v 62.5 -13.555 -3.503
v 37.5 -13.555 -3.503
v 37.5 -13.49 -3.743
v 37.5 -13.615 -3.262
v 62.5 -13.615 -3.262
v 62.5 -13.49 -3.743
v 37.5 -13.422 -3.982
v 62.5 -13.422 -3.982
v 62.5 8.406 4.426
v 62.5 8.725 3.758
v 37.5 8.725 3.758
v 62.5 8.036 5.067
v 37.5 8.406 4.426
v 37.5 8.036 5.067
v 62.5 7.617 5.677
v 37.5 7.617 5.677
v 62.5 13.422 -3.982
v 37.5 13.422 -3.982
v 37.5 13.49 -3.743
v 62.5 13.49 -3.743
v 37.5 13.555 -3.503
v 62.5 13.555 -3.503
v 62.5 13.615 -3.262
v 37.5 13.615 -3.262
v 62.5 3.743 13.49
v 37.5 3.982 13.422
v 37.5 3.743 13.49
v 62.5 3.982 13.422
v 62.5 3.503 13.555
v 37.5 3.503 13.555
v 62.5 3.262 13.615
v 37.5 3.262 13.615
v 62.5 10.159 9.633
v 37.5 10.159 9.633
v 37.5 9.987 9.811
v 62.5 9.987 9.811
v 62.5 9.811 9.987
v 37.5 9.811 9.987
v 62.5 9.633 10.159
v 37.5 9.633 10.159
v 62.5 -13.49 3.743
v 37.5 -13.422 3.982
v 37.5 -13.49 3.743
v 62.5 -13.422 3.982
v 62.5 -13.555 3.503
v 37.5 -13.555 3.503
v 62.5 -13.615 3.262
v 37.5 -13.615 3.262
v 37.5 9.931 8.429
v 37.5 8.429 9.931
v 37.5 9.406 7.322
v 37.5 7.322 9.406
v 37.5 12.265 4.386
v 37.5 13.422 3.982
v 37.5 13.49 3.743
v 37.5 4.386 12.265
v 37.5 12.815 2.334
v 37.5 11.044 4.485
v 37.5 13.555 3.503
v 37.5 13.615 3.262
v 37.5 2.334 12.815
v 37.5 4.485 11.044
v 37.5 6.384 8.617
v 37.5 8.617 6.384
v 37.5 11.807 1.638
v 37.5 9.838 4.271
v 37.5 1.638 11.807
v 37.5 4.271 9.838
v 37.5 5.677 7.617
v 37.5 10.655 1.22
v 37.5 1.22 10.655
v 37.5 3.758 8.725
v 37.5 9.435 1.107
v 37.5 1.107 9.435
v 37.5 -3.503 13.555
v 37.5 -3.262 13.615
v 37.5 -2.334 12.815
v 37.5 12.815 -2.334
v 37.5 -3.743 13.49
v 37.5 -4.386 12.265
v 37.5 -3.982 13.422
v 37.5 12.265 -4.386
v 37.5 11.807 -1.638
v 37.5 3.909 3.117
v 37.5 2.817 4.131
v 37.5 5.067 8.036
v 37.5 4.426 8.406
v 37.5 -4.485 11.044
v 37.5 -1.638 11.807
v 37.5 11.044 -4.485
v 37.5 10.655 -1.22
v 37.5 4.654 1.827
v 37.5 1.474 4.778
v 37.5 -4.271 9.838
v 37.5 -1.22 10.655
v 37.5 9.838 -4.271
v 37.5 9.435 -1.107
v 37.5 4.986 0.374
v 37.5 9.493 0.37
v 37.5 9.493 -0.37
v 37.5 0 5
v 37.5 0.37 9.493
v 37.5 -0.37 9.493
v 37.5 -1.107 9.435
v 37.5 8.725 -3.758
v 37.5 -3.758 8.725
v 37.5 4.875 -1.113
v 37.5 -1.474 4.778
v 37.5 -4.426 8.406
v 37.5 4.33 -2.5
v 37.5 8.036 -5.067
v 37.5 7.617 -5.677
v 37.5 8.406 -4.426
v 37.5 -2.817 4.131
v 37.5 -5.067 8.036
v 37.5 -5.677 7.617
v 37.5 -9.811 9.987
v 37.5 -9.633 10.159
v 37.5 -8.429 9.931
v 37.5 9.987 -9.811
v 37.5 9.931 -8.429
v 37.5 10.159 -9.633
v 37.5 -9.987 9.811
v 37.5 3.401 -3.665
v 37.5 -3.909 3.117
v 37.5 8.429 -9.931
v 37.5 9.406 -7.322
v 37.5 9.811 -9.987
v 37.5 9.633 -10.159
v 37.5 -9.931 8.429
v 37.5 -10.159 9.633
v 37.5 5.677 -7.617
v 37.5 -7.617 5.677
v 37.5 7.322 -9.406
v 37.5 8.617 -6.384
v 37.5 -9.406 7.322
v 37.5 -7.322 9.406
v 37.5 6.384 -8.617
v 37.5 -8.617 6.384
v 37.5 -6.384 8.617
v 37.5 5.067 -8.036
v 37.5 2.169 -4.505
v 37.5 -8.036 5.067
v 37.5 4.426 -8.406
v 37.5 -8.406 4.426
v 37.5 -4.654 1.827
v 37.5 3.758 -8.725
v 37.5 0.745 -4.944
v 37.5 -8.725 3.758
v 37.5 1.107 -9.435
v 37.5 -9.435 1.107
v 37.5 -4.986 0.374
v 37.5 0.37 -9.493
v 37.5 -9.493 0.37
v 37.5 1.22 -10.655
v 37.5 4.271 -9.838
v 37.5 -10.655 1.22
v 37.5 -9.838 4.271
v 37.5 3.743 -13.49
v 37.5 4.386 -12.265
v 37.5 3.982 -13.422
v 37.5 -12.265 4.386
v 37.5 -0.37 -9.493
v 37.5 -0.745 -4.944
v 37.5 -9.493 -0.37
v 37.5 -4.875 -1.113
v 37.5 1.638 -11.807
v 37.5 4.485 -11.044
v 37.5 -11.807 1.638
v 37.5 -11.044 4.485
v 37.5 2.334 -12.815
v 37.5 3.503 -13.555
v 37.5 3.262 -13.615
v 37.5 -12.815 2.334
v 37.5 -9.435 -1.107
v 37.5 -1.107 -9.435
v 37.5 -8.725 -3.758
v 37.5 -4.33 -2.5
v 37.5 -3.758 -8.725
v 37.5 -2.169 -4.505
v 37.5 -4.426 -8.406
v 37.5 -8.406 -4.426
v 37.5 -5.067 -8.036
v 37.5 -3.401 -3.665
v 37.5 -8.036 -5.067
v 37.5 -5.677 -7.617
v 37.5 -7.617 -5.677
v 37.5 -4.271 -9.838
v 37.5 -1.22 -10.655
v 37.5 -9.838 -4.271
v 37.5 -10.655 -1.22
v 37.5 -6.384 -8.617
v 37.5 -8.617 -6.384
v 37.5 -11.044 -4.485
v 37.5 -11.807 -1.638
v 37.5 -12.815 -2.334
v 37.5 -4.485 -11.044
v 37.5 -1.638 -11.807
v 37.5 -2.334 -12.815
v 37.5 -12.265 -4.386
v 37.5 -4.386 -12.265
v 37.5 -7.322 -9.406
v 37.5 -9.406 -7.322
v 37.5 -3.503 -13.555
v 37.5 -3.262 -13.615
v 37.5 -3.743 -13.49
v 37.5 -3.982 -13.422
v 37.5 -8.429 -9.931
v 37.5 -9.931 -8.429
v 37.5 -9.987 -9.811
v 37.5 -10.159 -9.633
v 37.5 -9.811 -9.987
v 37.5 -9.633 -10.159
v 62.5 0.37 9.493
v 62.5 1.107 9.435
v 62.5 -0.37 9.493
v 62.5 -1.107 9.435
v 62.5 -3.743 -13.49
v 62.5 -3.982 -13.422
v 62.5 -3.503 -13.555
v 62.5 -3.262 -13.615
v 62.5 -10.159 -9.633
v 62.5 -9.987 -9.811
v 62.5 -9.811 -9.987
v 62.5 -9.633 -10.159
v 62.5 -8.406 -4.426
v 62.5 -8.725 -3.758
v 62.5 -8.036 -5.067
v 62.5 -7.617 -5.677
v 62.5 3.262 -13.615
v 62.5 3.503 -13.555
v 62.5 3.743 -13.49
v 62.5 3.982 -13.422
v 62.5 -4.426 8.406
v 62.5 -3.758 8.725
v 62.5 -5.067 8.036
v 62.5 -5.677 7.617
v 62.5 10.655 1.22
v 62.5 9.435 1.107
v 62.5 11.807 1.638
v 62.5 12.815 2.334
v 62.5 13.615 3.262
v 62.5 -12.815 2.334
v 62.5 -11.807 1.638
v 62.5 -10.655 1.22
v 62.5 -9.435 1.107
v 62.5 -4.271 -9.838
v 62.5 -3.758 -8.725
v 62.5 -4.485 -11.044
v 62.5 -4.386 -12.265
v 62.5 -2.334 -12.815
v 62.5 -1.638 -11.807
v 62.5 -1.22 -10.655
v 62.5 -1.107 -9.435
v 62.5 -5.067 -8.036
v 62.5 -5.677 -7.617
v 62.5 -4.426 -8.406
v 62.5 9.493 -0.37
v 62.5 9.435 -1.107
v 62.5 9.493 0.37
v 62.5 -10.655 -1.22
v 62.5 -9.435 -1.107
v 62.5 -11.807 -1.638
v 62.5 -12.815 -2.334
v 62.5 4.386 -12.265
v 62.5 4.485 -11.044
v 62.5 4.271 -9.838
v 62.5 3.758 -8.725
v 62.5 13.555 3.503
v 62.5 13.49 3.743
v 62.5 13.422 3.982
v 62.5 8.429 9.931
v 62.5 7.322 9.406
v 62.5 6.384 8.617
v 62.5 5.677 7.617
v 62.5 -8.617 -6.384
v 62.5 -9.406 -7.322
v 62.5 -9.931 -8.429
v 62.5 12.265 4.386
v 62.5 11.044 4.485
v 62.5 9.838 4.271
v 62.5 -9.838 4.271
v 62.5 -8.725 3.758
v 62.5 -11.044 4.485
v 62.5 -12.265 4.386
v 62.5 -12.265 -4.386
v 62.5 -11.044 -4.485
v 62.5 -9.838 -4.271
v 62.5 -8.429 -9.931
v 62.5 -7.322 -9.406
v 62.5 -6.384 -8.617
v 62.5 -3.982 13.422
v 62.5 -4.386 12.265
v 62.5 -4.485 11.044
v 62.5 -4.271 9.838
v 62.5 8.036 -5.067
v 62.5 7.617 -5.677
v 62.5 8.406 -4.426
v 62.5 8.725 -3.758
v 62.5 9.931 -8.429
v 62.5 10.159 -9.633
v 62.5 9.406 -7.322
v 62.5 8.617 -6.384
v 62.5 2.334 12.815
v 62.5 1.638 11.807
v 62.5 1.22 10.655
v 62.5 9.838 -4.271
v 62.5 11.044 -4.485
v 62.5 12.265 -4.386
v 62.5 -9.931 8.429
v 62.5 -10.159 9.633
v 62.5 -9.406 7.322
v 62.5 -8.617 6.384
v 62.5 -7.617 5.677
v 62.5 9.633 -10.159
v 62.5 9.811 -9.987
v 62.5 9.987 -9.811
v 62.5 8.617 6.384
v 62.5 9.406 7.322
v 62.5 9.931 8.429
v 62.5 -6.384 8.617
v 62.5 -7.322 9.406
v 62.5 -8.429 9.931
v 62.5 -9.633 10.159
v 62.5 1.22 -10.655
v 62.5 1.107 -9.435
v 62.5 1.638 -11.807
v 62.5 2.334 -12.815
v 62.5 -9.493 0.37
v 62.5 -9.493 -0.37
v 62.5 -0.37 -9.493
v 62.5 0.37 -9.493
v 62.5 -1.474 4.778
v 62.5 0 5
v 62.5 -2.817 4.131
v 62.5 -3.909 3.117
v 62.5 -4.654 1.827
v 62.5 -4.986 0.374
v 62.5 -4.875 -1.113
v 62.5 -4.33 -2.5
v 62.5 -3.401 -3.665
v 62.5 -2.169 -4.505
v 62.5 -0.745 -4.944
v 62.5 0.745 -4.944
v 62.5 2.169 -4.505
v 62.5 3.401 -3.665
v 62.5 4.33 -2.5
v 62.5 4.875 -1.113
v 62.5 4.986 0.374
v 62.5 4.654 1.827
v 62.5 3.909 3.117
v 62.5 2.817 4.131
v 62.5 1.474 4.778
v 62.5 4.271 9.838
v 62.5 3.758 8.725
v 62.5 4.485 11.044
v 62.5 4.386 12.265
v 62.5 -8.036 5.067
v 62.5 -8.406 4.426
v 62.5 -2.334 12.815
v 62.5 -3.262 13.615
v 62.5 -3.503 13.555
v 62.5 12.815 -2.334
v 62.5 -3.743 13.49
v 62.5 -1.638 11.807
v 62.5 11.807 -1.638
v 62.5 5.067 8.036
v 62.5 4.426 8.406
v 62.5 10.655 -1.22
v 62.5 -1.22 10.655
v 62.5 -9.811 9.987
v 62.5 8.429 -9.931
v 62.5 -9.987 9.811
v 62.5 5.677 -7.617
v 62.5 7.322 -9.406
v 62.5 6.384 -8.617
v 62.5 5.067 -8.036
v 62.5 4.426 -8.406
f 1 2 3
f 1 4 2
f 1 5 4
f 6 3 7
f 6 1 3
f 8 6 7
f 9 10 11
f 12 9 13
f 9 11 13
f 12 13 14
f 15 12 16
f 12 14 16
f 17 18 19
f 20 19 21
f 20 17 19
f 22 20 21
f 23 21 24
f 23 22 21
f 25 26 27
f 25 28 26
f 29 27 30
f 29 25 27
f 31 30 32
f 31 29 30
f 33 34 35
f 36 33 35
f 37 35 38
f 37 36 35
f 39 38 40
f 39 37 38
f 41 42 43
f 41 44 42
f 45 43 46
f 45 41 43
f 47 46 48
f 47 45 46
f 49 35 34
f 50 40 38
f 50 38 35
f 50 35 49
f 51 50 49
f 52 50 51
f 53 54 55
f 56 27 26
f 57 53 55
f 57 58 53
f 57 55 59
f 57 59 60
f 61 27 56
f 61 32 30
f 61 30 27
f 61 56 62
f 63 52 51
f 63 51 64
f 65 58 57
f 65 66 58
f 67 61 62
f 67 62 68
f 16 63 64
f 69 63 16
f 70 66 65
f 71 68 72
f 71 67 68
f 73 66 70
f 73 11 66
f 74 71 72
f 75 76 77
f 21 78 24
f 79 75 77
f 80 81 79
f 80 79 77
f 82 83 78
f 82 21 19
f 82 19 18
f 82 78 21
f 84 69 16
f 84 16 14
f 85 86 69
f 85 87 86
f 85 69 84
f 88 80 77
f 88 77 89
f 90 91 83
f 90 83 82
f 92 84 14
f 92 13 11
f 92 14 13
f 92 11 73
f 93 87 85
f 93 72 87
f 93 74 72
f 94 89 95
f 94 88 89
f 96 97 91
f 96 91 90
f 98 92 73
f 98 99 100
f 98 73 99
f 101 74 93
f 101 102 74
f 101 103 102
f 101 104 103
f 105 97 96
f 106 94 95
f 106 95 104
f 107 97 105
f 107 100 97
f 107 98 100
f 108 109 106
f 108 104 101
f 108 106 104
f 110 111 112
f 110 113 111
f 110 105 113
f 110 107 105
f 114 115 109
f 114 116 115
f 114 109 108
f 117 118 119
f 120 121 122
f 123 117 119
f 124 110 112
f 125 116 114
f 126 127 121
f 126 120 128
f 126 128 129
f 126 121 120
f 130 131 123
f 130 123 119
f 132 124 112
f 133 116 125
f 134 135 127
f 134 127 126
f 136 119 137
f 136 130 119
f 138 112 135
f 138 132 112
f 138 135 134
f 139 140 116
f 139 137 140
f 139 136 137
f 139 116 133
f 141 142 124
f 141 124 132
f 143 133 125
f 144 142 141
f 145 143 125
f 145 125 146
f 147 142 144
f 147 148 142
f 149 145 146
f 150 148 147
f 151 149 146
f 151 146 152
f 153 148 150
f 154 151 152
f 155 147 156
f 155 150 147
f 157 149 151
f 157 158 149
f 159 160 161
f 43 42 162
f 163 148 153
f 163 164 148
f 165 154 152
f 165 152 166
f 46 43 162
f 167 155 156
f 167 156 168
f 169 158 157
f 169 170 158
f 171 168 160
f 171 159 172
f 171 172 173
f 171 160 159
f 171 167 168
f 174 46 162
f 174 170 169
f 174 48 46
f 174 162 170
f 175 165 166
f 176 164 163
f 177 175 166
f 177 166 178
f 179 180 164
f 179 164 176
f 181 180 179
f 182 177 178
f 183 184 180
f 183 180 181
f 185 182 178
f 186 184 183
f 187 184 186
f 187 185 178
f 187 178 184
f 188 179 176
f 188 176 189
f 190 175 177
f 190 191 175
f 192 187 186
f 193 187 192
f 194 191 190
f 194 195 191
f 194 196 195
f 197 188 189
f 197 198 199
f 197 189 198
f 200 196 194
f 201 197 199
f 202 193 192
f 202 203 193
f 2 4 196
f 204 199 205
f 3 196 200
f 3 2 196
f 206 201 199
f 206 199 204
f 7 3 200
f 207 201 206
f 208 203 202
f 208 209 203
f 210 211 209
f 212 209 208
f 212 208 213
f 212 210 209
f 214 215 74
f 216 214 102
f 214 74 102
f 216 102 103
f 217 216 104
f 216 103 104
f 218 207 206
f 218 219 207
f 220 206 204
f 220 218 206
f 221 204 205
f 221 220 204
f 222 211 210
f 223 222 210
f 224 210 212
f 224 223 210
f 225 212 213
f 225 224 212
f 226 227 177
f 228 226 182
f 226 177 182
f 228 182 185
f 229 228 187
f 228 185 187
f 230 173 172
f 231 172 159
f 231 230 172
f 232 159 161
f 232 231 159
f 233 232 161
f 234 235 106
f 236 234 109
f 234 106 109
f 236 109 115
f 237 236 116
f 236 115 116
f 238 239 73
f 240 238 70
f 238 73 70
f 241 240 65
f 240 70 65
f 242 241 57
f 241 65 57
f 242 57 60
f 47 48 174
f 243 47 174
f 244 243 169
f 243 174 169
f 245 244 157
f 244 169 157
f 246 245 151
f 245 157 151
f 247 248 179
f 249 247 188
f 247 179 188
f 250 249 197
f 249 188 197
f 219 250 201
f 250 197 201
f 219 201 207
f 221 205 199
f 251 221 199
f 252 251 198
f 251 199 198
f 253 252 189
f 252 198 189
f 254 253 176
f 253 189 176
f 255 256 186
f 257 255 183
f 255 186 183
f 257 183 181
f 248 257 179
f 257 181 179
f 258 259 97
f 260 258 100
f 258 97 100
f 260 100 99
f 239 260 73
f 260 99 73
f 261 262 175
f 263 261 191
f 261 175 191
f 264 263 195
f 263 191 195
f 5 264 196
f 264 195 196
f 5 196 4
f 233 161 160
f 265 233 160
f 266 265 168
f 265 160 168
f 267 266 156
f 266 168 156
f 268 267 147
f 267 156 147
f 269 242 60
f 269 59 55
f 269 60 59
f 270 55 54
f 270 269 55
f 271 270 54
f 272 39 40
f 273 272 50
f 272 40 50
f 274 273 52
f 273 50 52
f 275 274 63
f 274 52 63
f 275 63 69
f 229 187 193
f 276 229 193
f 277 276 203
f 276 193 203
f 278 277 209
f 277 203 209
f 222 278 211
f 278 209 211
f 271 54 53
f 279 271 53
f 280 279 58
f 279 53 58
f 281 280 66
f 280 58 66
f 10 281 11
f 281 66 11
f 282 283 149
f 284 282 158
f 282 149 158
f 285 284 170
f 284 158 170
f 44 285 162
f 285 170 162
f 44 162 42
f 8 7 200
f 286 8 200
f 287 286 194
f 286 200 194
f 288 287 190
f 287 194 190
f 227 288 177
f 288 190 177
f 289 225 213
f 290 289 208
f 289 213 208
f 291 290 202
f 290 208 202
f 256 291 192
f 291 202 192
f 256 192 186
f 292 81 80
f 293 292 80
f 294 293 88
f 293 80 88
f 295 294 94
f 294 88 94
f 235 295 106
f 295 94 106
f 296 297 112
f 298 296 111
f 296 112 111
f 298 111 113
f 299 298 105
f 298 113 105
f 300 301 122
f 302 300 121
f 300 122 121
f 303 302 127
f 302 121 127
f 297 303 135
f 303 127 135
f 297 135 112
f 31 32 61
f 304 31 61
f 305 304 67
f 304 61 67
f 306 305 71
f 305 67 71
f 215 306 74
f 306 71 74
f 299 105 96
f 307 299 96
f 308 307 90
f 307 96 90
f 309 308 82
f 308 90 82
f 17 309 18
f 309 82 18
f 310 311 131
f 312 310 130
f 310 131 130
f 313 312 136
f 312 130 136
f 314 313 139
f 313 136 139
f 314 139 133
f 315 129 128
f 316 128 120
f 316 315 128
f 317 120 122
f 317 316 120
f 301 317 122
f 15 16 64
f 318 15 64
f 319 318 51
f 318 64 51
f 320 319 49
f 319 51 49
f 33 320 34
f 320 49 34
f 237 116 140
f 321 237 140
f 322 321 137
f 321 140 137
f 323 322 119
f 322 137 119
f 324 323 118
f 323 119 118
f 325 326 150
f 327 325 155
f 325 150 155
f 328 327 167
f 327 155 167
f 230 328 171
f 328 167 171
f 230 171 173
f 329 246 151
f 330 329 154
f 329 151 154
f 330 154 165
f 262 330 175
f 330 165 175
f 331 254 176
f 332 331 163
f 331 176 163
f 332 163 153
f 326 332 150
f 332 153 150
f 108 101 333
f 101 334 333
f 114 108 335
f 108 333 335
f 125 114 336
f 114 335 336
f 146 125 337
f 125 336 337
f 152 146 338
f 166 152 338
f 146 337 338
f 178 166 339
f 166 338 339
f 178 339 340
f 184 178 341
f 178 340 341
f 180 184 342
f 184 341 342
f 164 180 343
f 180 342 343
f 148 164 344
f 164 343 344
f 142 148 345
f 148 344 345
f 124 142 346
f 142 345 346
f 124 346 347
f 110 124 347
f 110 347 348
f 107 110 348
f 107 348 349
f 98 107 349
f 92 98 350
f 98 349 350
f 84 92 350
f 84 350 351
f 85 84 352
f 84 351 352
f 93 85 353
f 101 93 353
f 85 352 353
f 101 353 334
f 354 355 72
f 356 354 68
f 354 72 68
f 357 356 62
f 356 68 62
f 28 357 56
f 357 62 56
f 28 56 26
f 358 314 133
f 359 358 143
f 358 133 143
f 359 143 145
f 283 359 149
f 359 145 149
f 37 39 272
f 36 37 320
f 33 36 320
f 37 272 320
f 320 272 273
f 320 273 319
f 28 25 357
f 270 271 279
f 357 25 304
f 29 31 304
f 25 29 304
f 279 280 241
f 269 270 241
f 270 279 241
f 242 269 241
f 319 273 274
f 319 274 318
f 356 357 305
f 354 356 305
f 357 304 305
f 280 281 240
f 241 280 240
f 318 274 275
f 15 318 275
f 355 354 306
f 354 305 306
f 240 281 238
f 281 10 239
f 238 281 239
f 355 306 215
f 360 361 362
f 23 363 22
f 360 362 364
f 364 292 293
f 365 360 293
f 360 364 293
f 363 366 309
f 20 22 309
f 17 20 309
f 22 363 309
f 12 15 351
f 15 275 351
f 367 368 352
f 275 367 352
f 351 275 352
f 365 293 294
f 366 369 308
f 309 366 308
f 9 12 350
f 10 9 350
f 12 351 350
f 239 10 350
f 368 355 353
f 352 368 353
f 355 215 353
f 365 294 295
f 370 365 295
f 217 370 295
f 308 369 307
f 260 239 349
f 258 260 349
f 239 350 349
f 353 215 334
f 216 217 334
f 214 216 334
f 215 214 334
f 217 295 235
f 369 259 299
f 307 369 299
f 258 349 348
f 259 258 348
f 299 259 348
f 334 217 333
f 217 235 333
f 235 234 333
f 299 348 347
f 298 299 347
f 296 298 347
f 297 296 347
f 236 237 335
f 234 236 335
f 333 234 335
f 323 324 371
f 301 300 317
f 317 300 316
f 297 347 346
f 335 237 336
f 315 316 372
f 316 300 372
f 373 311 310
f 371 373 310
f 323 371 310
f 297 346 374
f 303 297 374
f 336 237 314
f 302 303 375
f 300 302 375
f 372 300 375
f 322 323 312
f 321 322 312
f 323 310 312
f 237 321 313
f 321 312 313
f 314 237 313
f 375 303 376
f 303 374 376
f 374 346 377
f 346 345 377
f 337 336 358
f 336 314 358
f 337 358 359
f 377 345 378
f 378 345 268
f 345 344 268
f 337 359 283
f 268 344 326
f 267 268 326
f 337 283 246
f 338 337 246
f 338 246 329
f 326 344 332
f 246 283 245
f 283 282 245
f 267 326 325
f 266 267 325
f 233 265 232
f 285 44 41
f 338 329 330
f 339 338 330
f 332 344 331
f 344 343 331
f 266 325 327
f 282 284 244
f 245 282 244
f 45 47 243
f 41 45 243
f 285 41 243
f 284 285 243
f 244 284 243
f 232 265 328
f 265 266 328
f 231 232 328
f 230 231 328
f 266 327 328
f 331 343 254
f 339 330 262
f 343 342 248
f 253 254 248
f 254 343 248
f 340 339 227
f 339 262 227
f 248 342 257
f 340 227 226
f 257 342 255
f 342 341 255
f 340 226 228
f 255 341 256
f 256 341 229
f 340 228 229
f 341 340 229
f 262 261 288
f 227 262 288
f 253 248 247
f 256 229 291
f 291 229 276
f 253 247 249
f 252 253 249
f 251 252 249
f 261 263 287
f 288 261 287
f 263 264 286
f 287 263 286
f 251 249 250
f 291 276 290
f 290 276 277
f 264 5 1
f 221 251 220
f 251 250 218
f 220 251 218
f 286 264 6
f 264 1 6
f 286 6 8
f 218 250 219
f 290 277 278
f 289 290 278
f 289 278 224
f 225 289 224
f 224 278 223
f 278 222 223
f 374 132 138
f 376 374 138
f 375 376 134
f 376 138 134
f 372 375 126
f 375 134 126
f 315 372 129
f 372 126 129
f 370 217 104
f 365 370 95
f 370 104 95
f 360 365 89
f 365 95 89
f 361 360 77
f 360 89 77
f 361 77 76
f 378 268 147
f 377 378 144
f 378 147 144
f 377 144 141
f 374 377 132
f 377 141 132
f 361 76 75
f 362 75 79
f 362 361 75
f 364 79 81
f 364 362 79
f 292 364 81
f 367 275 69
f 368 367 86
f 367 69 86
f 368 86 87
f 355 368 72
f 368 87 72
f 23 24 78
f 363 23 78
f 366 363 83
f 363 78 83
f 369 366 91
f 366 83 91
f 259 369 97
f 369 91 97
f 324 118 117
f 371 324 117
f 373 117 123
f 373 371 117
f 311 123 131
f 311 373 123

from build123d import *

# Parameters (mm, degrees)
BASPROSKE_W     = 100
BASPROSKE_H     = 56
TOOTHCUT_DEPTH  = 128.561749753
TEETHCUTS_COUNT = 12
TEETHCUTS_ANGLE = 330
BORSKE_R        = 20
BORE_DEPTH      = 100.0000508
SCALE1_SCALE    = 0.25


with BuildPart() as part:
    # BasProSke → Base-Revolve (revolve)
    with BuildSketch(Plane(origin=(0, 0, 0), x_dir=(1, 0, 0), z_dir=(0, 1, 0)), mode=Mode.PRIVATE) as base_revolve_sk:
        with Locations((50, 28)):
            Rectangle(BASPROSKE_W, BASPROSKE_H)
    revolve(base_revolve_sk.sketch.rotate(Axis((-10, 0, 0), (1, 0, 0)), 180), axis=Axis((-10, 0, 0), (1, 0, 0)))

    # TooCutSke → ToothCut (cut, through all)
    with BuildSketch(Plane(origin=(0, 0, 0), x_dir=(0, 0, -1), z_dir=(1, 0, 0))):
        with BuildLine():
            ThreePointArc((4.429508858, 37.739945049), (0, 37.999), (-4.429508858, 37.739945049))
            ThreePointArc((-4.429508858, 37.739945049), (-6.560078122, 47.242513828), (-13.078840191, 54.477420868))
            ThreePointArc((-13.078840191, 54.477420868), (0, 56.0254), (13.078840191, 54.477420868))
            ThreePointArc((13.078840191, 54.477420868), (6.560078122, 47.242513828), (4.429508858, 37.739945049))
        make_face()
    toothcut = extrude(amount=TOOTHCUT_DEPTH, mode=Mode.SUBTRACT)

    # TeethCuts: ToothCut ×12 about axis
    teethcuts_axis = Axis((-10, 0, 0), (1, 0, 0))
    for i in range(1, TEETHCUTS_COUNT):
        add(toothcut.rotate(teethcuts_axis, i * TEETHCUTS_ANGLE / (TEETHCUTS_COUNT - 1)), mode=Mode.SUBTRACT)

    # BorSke → Bore (cut, symmetric)
    with BuildSketch(Plane(origin=(0, 0, 0), x_dir=(0, 0, -1), z_dir=(1, 0, 0))):
        with Locations(Location((0, 0, 0), (0, 0, 180))):
            Circle(BORSKE_R)
    extrude(amount=BORE_DEPTH, both=True, mode=Mode.SUBTRACT)


with BuildPart() as part_1:
    # Scale1: scaled about (50, 0, 0)
    add(part.part.scale(SCALE1_SCALE).moved(Location((37.5, 0, 0))))


solid = part_1.part
